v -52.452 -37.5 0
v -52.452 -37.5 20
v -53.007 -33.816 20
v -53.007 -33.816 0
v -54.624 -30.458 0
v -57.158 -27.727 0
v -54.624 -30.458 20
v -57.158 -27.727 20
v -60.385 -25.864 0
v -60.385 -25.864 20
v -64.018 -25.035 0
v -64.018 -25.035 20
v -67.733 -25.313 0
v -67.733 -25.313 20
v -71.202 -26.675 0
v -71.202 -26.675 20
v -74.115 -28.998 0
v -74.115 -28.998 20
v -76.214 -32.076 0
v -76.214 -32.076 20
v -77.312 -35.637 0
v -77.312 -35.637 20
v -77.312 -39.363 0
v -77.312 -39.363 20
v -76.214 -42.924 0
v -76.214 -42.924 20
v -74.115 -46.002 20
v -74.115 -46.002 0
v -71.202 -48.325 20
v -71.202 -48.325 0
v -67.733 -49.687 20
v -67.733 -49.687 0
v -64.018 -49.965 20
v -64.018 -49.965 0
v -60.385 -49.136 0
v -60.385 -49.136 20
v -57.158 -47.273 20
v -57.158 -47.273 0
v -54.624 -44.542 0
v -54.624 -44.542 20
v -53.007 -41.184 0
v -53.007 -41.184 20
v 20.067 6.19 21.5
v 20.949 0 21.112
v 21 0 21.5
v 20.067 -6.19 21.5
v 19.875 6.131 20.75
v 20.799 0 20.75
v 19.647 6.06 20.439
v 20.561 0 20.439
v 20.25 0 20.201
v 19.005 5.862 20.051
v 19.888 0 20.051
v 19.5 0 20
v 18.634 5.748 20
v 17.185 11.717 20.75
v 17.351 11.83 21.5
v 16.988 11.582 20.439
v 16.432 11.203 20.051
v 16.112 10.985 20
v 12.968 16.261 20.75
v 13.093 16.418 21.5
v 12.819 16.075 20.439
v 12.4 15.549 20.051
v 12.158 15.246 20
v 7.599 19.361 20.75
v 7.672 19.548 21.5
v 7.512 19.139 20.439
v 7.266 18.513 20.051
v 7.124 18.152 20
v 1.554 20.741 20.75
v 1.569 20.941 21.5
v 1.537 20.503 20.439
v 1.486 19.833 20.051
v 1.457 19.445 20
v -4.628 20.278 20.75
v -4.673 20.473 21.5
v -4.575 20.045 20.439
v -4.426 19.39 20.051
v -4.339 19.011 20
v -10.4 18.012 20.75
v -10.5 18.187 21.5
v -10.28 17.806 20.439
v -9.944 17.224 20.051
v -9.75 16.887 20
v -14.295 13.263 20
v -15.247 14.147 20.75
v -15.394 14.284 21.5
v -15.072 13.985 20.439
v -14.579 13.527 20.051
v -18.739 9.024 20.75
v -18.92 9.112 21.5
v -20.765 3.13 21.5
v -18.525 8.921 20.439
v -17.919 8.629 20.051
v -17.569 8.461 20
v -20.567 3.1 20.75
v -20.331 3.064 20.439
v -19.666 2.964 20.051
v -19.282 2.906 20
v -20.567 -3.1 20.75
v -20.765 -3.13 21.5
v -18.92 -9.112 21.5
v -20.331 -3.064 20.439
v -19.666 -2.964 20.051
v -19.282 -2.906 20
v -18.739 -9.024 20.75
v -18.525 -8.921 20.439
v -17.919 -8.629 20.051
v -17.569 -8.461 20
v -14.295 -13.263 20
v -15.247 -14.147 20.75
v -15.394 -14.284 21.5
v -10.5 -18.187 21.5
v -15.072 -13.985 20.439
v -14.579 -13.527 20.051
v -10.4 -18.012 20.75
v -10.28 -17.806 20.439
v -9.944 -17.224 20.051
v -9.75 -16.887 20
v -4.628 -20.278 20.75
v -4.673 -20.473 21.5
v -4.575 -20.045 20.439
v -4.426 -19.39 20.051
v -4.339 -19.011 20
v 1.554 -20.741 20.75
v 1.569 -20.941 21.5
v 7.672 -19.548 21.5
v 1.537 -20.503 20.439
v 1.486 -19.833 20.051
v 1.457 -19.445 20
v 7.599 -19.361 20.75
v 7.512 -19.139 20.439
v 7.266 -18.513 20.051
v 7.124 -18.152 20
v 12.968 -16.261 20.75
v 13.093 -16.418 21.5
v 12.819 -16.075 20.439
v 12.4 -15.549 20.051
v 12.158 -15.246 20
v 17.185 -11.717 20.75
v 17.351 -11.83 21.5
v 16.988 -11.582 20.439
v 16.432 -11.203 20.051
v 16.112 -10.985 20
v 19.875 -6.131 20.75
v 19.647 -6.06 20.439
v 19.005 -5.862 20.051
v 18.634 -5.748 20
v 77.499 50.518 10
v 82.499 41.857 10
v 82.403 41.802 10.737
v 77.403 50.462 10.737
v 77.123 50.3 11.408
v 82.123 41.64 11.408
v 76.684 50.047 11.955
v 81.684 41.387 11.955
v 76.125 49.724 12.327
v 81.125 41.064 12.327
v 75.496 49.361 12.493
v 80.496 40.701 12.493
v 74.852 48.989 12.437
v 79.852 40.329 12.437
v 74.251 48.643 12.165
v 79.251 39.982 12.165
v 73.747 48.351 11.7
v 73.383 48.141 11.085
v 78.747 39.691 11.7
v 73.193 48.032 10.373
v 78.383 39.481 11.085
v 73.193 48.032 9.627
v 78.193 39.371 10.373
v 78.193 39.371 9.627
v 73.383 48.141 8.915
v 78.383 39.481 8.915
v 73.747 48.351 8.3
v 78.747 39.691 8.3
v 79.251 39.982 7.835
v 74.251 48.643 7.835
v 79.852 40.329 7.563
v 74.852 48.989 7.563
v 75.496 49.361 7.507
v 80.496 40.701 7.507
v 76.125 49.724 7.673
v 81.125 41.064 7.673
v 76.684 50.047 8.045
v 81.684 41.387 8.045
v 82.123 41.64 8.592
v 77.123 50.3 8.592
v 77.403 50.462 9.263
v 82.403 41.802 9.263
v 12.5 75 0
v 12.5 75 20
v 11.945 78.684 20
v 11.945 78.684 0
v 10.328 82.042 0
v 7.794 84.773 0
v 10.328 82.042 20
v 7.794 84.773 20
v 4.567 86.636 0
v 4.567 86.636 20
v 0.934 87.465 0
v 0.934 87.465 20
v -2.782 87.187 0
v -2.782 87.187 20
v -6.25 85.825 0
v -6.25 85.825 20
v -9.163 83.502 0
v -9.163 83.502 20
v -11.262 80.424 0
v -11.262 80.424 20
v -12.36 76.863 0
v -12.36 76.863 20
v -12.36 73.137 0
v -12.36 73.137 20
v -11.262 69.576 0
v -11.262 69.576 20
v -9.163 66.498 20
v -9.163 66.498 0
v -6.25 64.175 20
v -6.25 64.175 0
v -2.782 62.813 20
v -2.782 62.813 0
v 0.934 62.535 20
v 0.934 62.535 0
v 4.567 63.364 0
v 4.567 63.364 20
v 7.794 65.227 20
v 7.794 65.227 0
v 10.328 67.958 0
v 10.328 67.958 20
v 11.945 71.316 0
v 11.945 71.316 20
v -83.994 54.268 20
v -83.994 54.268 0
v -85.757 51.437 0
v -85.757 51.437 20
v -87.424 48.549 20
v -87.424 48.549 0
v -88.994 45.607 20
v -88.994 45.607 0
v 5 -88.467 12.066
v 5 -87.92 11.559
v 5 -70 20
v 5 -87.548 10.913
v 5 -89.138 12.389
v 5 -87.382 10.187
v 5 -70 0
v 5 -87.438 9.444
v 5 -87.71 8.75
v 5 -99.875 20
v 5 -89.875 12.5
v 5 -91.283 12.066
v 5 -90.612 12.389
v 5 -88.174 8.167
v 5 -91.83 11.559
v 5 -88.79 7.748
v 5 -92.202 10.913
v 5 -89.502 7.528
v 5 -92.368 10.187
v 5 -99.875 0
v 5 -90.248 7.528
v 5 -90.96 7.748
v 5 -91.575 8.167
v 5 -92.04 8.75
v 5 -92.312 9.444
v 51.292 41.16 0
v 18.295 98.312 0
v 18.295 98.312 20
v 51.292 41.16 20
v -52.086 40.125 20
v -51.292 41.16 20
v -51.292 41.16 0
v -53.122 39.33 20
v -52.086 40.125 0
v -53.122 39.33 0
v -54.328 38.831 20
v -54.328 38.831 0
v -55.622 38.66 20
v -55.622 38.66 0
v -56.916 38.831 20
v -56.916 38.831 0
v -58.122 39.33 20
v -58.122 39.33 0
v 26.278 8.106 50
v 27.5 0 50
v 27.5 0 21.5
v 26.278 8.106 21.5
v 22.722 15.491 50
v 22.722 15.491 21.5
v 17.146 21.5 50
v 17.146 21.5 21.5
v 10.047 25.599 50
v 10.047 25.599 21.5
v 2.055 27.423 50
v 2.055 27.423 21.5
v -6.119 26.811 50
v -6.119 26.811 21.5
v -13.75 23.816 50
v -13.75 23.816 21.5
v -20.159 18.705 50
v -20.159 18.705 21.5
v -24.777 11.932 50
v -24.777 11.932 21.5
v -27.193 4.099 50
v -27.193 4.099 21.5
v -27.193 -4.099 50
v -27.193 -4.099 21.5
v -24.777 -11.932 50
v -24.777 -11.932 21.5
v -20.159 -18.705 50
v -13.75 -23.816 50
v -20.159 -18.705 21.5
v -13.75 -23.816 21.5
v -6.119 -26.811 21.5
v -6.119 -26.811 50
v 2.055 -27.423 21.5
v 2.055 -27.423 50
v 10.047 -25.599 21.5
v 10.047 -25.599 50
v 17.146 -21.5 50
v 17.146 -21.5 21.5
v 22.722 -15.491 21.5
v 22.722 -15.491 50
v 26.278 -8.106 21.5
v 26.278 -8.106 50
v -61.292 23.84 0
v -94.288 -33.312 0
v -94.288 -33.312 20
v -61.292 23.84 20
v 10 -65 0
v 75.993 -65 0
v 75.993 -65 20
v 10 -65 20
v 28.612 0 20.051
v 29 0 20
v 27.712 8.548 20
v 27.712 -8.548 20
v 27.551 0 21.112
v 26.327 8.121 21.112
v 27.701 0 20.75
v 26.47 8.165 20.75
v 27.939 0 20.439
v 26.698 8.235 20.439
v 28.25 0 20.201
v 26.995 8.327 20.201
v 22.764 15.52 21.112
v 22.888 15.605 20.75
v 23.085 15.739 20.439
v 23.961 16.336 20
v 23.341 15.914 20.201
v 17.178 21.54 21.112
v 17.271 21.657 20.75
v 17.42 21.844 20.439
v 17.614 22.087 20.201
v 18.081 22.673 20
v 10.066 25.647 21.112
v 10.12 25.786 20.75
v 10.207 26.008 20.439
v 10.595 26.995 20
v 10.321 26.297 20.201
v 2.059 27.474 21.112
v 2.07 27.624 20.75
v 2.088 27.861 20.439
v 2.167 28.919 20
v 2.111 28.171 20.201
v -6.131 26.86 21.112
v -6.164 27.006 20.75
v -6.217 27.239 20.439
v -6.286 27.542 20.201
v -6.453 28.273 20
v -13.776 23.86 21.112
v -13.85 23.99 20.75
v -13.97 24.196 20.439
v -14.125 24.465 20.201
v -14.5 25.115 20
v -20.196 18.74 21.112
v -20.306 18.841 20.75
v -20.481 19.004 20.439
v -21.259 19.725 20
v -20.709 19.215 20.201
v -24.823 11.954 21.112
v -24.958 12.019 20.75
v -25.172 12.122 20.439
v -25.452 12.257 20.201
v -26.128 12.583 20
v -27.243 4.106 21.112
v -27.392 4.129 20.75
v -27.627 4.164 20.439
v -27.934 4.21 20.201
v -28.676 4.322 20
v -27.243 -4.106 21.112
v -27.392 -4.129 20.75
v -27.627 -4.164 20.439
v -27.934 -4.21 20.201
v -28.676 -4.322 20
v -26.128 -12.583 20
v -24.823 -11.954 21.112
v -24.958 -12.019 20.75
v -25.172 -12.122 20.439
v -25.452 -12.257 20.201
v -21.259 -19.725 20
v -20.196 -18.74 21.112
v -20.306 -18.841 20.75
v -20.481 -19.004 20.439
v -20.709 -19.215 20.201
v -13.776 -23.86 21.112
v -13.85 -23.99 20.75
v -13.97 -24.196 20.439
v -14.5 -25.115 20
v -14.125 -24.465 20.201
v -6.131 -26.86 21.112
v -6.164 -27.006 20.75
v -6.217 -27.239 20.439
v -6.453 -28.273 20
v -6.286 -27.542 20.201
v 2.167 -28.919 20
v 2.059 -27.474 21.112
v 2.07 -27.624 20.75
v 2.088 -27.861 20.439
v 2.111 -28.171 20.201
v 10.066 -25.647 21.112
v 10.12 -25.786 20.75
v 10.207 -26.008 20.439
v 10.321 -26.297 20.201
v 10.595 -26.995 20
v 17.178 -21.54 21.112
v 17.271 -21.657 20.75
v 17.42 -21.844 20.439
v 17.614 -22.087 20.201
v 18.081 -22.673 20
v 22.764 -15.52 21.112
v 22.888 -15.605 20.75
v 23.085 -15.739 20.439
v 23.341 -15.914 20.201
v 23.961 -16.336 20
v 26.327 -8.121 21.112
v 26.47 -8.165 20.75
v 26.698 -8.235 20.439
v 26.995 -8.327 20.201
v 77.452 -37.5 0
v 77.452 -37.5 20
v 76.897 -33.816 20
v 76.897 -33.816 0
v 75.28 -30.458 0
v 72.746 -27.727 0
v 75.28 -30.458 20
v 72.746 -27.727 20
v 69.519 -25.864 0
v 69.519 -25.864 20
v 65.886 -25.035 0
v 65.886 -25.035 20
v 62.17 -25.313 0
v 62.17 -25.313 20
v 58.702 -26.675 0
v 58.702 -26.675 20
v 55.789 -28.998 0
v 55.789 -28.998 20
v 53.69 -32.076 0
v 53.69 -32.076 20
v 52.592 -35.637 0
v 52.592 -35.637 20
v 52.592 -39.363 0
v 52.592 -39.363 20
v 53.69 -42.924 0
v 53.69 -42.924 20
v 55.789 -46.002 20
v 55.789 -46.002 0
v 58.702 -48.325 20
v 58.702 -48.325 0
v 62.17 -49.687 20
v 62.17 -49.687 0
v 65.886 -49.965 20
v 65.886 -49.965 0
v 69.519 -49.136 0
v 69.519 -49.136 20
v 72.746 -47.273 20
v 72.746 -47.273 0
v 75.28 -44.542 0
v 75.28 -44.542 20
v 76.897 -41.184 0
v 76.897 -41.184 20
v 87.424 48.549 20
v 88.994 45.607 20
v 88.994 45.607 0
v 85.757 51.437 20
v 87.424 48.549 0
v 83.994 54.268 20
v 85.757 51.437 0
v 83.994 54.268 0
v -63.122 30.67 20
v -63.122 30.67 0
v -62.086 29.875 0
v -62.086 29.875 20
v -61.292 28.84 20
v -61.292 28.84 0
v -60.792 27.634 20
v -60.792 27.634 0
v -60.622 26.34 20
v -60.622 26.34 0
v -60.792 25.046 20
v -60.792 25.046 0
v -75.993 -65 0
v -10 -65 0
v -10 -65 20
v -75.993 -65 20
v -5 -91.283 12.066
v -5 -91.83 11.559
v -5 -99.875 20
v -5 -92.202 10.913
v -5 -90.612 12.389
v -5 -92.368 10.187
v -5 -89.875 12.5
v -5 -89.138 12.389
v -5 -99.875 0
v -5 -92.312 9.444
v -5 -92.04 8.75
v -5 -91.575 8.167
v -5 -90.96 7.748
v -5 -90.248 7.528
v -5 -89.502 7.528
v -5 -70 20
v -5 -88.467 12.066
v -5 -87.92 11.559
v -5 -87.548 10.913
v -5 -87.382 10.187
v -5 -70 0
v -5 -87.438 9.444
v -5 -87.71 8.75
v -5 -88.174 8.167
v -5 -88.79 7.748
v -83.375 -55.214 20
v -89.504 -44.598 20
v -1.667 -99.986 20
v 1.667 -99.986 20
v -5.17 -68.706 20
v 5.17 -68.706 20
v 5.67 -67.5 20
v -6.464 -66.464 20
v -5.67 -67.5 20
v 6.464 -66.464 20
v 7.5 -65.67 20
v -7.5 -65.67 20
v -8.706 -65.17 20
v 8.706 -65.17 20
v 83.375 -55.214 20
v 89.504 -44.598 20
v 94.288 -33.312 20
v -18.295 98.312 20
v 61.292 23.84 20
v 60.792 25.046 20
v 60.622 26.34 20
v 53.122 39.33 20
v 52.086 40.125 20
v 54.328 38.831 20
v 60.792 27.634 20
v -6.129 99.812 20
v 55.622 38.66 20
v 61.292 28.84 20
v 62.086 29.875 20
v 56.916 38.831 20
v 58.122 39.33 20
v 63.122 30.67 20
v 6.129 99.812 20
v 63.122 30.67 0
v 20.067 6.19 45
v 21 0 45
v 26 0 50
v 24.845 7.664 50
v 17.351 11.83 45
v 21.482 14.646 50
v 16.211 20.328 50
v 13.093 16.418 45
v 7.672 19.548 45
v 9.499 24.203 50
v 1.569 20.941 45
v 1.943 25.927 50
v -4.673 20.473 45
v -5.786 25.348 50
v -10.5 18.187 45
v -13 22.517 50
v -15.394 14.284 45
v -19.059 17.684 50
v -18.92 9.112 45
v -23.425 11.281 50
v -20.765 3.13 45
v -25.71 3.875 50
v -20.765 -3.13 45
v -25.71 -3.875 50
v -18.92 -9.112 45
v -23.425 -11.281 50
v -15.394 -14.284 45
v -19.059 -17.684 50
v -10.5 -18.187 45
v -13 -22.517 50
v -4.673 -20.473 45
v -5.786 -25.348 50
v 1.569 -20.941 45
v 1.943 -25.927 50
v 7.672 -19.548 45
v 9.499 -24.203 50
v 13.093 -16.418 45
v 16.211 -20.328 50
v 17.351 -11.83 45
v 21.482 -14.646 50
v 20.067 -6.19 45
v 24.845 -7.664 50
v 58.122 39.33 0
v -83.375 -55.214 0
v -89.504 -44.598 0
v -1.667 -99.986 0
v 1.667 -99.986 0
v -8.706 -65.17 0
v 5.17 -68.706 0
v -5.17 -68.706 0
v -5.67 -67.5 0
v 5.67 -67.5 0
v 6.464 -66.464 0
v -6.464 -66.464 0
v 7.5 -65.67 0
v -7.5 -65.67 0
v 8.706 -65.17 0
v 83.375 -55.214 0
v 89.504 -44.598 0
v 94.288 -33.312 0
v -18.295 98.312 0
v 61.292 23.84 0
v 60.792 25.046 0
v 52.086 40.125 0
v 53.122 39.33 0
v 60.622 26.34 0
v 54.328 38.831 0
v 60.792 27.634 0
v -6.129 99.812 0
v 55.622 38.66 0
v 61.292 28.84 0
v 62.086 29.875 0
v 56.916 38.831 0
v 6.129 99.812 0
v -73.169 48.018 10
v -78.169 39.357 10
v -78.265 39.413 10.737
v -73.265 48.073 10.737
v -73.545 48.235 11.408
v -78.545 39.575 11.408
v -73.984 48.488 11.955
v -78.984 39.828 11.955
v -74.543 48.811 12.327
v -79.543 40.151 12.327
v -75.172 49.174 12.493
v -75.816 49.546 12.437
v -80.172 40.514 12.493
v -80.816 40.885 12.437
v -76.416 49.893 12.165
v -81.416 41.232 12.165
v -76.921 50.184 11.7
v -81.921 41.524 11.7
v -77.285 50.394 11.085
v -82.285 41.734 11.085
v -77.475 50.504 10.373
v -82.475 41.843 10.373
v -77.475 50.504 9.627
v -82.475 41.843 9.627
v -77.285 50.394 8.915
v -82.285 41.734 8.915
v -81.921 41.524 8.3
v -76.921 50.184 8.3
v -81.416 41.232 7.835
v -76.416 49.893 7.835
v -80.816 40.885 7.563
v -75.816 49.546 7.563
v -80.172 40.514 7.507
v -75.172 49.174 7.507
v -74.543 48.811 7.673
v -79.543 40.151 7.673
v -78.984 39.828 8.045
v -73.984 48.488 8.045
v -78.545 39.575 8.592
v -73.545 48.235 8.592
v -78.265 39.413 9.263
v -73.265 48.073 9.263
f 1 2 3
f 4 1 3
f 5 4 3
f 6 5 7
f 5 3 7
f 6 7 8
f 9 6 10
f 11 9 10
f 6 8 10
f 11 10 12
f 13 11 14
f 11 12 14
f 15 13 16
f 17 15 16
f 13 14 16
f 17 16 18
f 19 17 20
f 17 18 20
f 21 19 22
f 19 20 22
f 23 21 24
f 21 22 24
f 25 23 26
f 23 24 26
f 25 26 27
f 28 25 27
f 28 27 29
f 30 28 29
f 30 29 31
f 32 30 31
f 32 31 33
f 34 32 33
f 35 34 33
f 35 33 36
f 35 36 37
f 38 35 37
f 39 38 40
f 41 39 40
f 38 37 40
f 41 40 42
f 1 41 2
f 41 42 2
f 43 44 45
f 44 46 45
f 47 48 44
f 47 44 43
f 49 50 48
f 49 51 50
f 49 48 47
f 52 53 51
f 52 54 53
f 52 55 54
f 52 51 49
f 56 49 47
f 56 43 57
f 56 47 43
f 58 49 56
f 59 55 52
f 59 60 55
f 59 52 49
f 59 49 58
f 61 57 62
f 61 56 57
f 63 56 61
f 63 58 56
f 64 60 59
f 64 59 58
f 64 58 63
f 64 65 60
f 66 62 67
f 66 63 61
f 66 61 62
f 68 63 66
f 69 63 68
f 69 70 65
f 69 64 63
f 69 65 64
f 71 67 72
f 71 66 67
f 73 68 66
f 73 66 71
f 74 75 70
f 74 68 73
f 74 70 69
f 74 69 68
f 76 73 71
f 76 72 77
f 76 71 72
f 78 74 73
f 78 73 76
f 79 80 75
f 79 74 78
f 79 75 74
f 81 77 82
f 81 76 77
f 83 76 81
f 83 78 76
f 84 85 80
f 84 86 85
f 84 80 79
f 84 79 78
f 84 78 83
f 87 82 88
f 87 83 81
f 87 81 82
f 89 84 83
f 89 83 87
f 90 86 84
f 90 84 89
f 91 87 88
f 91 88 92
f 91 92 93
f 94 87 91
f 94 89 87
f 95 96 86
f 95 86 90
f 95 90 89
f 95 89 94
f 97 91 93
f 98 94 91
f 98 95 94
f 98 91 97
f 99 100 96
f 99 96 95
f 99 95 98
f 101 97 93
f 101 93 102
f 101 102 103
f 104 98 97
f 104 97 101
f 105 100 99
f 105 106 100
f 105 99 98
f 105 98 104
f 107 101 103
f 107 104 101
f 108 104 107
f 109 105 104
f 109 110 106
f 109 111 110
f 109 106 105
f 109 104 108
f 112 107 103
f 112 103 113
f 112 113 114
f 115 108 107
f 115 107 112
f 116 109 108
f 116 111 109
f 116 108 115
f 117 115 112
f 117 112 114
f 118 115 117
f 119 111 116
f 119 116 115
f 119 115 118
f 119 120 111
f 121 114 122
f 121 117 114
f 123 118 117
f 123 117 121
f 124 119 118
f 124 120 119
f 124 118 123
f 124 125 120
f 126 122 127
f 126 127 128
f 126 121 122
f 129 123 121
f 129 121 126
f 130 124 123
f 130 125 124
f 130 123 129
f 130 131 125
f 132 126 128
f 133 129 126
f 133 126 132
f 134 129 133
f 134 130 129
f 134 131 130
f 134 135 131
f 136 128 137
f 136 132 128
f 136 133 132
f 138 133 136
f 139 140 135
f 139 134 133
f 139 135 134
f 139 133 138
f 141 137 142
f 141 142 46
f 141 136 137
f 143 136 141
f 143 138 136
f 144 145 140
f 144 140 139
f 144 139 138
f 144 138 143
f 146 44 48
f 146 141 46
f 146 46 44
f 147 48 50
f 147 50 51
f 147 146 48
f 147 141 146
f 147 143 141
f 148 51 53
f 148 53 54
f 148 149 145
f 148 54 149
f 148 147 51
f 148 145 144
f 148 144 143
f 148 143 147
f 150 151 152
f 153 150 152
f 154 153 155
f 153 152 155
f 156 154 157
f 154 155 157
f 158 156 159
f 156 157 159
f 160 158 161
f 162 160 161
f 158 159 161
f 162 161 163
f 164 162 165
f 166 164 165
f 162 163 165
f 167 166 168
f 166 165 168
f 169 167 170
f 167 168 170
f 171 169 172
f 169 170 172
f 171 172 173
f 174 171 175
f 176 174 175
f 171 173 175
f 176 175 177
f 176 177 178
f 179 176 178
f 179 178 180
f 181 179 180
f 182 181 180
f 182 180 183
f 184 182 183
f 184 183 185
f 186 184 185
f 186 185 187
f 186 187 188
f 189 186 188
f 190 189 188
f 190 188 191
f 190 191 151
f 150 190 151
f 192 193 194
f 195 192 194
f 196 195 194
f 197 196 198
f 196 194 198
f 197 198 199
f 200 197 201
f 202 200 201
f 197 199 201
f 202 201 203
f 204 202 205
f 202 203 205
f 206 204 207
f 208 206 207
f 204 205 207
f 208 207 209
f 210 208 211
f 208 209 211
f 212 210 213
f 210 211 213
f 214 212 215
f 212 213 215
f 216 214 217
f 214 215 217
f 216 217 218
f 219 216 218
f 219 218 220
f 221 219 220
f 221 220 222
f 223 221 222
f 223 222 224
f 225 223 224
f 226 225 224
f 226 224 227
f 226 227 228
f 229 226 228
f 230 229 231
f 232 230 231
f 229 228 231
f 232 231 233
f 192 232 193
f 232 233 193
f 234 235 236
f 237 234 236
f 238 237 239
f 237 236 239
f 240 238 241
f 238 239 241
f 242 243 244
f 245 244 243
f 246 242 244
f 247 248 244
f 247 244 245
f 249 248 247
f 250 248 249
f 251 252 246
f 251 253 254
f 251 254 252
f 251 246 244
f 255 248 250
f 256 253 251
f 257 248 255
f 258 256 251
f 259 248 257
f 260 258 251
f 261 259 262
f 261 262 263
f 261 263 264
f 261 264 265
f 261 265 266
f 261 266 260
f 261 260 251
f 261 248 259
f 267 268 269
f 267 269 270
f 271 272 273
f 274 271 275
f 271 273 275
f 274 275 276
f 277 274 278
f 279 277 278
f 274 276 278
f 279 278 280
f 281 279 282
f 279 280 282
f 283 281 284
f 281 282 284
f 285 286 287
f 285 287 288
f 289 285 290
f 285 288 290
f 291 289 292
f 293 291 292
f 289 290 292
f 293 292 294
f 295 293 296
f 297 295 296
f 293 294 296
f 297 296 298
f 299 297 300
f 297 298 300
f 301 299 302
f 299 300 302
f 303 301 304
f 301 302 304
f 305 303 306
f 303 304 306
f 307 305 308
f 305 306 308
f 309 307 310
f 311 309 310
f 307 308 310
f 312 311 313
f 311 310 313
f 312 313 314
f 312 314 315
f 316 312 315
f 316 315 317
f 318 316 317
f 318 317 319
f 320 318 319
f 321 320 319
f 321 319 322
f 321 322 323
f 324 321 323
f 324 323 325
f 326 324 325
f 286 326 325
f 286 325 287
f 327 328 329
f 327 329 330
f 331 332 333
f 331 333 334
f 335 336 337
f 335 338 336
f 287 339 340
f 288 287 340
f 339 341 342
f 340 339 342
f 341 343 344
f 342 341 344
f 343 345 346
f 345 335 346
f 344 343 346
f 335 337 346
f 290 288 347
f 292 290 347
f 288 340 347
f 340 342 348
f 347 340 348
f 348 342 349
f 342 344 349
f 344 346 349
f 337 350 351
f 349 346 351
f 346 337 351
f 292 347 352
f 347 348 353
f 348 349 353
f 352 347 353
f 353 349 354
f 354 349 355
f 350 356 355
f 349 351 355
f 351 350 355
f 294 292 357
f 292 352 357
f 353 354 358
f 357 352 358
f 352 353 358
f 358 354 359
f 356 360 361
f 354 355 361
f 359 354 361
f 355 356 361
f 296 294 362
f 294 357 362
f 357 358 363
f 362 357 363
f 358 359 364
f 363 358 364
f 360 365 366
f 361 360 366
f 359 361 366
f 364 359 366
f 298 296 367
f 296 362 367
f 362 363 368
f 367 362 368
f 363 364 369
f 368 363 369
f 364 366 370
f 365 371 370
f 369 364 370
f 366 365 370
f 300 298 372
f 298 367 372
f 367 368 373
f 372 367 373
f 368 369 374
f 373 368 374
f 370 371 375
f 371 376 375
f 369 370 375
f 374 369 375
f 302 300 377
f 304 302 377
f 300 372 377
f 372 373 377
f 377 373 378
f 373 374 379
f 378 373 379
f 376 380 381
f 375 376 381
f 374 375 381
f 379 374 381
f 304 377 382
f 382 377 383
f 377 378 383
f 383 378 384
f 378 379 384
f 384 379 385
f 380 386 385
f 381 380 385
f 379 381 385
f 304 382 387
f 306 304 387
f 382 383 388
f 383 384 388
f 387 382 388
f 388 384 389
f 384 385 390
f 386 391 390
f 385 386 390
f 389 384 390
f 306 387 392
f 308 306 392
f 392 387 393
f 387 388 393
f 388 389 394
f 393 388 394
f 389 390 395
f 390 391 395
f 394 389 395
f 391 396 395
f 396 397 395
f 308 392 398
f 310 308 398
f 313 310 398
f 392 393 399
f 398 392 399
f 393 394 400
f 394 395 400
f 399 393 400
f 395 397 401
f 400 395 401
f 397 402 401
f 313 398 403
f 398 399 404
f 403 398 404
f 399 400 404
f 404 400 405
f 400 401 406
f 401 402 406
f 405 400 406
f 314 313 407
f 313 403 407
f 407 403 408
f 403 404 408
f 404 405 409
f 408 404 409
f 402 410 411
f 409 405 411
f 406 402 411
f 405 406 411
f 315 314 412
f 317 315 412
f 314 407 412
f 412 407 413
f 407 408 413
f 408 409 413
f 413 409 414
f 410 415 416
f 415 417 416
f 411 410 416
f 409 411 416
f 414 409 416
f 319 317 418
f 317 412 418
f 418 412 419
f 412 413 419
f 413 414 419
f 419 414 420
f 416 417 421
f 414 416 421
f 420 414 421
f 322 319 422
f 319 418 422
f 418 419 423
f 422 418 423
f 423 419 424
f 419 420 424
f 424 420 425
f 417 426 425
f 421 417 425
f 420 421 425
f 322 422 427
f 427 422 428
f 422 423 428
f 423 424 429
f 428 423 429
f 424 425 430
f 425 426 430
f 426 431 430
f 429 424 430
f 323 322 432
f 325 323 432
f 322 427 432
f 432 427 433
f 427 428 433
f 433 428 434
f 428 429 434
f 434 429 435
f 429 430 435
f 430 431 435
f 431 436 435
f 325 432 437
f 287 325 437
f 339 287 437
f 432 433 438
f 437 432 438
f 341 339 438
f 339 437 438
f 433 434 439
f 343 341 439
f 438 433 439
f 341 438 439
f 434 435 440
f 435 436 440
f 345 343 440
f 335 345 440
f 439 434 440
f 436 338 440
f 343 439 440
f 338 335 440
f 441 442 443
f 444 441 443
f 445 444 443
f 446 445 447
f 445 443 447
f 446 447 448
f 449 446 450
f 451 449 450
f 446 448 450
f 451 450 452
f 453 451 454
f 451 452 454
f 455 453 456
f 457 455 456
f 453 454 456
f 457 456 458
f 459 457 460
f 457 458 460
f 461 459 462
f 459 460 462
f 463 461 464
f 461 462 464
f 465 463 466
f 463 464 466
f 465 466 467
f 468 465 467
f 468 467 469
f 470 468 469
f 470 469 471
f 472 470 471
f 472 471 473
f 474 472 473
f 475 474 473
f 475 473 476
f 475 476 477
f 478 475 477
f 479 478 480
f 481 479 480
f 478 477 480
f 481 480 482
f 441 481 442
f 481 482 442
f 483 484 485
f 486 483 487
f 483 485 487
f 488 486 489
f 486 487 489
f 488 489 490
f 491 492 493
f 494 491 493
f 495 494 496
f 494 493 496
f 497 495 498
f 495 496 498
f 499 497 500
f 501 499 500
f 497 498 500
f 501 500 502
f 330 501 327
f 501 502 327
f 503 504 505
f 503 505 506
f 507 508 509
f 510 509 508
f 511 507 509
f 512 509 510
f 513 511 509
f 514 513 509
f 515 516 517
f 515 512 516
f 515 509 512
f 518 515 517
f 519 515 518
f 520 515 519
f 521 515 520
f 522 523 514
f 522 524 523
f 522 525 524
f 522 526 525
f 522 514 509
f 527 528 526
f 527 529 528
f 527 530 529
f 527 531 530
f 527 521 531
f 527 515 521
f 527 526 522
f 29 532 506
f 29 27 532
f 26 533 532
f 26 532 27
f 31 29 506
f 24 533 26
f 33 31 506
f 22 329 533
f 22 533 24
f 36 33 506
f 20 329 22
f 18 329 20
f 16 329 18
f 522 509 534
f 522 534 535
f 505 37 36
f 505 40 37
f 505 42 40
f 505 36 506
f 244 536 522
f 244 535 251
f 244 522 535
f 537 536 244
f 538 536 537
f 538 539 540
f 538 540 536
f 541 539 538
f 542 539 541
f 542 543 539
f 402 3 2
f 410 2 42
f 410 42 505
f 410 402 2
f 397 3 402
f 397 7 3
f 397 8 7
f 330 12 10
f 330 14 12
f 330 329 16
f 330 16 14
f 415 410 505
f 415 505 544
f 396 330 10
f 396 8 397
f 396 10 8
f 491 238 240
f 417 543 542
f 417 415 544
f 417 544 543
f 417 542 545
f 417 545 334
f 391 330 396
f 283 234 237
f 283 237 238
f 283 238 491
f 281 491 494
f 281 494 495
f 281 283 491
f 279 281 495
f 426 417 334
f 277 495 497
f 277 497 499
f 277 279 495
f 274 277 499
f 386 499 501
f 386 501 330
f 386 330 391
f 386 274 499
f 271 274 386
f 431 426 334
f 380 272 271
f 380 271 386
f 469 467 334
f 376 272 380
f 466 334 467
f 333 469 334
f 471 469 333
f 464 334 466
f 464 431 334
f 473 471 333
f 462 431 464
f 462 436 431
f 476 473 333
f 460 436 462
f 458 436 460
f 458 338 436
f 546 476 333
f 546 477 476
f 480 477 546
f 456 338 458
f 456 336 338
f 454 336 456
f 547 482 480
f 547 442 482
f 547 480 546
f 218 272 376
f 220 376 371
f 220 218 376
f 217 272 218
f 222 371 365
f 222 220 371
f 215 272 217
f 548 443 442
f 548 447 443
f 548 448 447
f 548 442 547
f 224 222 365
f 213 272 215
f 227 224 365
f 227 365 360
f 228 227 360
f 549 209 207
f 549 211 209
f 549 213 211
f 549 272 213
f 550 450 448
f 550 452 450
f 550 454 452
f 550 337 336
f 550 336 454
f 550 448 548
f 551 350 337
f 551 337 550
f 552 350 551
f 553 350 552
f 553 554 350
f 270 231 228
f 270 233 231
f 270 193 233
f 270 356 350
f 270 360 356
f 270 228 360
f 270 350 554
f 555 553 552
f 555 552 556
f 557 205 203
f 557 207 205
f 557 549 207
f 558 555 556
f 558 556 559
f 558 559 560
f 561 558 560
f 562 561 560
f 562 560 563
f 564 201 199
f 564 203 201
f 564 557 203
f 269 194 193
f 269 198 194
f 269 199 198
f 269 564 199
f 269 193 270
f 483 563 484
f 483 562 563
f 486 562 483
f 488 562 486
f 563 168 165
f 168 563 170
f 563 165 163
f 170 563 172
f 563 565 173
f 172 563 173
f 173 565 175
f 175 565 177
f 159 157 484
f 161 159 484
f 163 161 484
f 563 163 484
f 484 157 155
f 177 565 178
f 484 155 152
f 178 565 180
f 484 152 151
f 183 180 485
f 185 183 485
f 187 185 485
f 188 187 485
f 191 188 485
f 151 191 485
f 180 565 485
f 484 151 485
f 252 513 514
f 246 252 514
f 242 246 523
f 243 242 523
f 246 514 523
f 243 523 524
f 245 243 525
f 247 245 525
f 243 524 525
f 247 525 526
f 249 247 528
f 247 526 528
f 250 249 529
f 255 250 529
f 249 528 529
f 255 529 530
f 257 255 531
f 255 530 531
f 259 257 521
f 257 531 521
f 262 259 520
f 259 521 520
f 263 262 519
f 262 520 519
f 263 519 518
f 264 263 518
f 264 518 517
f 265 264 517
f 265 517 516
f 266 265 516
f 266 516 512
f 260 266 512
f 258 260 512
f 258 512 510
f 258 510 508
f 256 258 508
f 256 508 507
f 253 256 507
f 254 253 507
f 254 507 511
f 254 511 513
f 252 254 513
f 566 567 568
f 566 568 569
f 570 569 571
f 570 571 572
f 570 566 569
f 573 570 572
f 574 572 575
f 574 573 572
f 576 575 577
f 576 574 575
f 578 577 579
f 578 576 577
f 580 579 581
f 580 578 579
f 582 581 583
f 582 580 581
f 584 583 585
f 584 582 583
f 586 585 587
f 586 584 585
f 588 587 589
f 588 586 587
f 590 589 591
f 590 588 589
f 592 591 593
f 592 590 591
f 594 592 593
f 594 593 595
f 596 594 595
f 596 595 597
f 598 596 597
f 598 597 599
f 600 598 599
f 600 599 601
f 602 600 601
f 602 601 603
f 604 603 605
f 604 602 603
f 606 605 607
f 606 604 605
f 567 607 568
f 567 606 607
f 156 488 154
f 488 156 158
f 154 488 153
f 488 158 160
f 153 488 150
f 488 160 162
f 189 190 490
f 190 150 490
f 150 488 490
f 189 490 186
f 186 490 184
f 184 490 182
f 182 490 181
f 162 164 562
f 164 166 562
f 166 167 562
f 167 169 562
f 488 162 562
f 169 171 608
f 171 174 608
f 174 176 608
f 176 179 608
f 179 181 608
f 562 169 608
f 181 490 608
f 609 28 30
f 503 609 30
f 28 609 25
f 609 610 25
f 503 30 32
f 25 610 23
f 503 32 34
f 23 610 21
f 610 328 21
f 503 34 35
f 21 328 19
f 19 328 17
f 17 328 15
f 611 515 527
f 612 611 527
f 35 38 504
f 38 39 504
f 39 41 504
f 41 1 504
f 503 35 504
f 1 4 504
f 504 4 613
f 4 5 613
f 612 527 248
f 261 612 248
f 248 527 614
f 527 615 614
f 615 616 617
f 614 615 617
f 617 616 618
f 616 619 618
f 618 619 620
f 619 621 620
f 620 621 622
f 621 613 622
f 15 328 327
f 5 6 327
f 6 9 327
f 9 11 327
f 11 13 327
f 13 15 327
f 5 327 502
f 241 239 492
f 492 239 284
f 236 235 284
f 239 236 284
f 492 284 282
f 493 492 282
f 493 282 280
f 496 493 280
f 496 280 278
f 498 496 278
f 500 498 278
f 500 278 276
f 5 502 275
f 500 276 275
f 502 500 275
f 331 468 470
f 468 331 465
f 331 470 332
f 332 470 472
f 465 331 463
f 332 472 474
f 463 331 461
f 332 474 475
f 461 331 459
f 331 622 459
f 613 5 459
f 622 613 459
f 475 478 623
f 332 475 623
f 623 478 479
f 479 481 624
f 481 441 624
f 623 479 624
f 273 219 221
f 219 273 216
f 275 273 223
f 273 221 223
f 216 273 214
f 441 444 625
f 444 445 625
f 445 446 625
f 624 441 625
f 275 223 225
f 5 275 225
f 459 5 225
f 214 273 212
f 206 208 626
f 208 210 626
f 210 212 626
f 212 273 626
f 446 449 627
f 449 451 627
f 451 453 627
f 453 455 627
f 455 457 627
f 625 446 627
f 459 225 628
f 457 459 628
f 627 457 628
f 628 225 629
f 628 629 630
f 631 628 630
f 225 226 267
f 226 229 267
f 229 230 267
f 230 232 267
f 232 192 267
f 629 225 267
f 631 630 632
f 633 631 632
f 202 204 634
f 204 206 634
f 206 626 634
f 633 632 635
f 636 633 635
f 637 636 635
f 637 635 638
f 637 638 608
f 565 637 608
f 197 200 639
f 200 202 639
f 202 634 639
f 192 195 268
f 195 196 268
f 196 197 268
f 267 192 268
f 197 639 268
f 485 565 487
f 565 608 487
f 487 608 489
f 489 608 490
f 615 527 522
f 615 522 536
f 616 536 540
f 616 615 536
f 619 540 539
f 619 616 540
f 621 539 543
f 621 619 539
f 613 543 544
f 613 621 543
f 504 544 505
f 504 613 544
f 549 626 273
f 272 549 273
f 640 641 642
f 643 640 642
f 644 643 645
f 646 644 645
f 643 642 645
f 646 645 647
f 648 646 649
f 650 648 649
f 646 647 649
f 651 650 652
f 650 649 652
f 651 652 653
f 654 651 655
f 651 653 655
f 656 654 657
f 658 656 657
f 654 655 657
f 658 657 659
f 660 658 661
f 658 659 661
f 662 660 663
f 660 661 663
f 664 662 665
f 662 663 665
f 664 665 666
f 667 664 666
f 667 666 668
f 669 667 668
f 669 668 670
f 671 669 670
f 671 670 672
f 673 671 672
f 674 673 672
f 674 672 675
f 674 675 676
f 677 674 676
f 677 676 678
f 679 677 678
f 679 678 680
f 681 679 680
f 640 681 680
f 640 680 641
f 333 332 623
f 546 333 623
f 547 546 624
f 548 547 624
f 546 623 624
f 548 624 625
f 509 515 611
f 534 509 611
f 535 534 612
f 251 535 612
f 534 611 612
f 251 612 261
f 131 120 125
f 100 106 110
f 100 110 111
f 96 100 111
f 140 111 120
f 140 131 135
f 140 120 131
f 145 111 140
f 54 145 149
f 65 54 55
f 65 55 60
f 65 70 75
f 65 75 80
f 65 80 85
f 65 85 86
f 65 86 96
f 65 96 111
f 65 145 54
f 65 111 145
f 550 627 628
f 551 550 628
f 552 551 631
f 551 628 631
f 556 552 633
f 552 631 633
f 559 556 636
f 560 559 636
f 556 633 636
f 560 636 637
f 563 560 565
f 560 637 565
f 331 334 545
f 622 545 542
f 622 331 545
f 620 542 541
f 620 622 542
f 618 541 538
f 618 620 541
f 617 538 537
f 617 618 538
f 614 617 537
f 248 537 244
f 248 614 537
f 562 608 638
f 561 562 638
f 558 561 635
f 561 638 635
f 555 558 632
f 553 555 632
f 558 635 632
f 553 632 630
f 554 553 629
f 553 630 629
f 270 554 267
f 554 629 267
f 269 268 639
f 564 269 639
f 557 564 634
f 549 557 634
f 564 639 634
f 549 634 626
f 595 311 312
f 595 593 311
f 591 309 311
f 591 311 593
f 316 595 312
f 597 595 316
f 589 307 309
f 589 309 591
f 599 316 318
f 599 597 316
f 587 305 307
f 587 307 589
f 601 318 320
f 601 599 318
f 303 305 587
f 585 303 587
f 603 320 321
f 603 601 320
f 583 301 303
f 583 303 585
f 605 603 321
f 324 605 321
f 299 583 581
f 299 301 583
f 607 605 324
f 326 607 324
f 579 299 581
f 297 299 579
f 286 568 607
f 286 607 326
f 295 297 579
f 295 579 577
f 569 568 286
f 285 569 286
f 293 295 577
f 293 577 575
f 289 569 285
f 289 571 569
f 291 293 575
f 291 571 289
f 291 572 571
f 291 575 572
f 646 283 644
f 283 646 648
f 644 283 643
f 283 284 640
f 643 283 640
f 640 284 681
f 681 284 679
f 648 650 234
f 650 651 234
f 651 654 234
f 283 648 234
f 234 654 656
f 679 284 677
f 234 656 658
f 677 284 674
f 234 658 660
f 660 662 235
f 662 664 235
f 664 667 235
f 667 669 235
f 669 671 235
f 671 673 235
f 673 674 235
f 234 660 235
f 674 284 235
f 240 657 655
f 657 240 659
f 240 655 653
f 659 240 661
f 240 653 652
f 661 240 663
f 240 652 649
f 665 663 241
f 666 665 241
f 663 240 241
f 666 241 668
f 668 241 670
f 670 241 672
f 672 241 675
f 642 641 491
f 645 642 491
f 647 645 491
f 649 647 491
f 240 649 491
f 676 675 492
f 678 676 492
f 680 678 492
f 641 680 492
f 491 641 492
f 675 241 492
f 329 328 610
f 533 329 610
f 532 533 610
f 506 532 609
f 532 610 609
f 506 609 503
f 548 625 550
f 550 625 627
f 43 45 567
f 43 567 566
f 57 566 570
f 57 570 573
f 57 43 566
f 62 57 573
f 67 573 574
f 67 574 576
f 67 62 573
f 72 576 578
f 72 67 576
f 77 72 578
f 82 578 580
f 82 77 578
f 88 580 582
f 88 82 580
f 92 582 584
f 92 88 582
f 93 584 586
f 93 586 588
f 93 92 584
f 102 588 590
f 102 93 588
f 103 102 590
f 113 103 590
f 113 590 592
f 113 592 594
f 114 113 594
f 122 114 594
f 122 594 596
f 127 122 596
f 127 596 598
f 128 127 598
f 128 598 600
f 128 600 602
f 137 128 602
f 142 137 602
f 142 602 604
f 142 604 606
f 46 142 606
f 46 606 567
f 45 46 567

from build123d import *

# Parameters (mm, degrees)
SKETCH1_R           = 27.5
SKETCH1_R_2         = 21
BOSS_EXTRUDE1_DEPTH = 50
SKETCH1_3_R         = 100
SKETCH1_3_R_2       = 27.5
SKETCH1_3_R_3       = 21
BOSS_EXTRUDE2_DEPTH = 20
CHAMFER1_SIZE       = 5
FILLET1_R           = 1.5
SKETCH10_R          = 12.5
CUT_EXTRUDE1_DEPTH  = 20
SKETCH12_W          = 90
SKETCH12_H          = 35
CUT_EXTRUDE3_DEPTH  = 151
SKETCH13_R          = 2.5
CUT_EXTRUDE4_DEPTH  = 151.840188116
SKETCH14_R          = 2.5
CUT_EXTRUDE5_DEPTH  = 150.526515224
SKETCH15_R          = 2.5
CUT_EXTRUDE6_DEPTH  = 151.840188116


with BuildPart() as part:
    # Sketch1 → Boss-Extrude1 (new body)
    with BuildSketch(Plane.XY):
        Circle(SKETCH1_R)
        Circle(SKETCH1_R_2, mode=Mode.SUBTRACT)
    extrude(amount=BOSS_EXTRUDE1_DEPTH)

    # Sketch1<3> → Boss-Extrude2 (add)
    # profile 1 of 2: a face of its own
    with BuildSketch(Plane.XY):
        Circle(SKETCH1_3_R)
        Circle(SKETCH1_3_R_2, mode=Mode.SUBTRACT)
    # profile 2 of 2: a face of its own
    with BuildSketch(Plane.XY):
        Circle(SKETCH1_3_R_3)
    extrude(amount=BOSS_EXTRUDE2_DEPTH)

    # Chamfer1
    chamfer1_edges = [part.edges().sort_by_distance(p)[0] for p in [
        (-21, 0, 50),
    ]]
    chamfer(chamfer1_edges, length=CHAMFER1_SIZE)

    # Fillet1
    fillet1_edges = [part.edges().sort_by_distance(p)[0] for p in [
        (-21, 0, 20),
        (-27.5, 0, 20),
    ]]
    fillet(fillet1_edges, radius=FILLET1_R)

    # Sketch10 → Cut-Extrude1 (cut)
    with BuildSketch(Plane.XY.offset(20)):
        with Locations((0, 75)):
            Circle(SKETCH10_R)
        with Locations((64.951905284, -37.5)):
            Circle(SKETCH10_R)
        with Locations((-64.951905284, -37.5)):
            Circle(SKETCH10_R)
    extrude(amount=-CUT_EXTRUDE1_DEPTH, mode=Mode.SUBTRACT)

    # Sketch12 → Cut-Extrude3 (cut, through all)
    with BuildSketch(Plane(origin=(0, 0, 0), x_dir=(-1, 0, 0), z_dir=(0, 0, -1))):
        with BuildLine():
            Line((-15, -130), (-15, -70))
            ThreePointArc((-15, -70), (-10, -65), (-5, -70))
            Line((-5, -70), (-5, -130))
            ThreePointArc((-5, -130), (-10, -135), (-15, -130))
        make_face()
        Polygon((-61.291651246, 23.839745962), (-91.602540378, 41.339745962), (-136.602540378, -36.602540378), (-106.291651246, -54.102540378), align=None)
        with BuildLine():
            Line((5, -130), (5, -70))
            ThreePointArc((5, -70), (10, -65), (15, -70))
            Line((15, -70), (15, -130))
            ThreePointArc((15, -130), (10, -135), (5, -130))
        make_face()
        with Locations((-55, -82.5)):
            Rectangle(SKETCH12_W, SKETCH12_H)
        with Locations((55, -82.5)):
            Rectangle(SKETCH12_W, SKETCH12_H)
        Polygon((-51.291651246, 41.160254038), (-81.602540378, 58.660254038), (-36.602540378, 136.602540378), (-6.291651246, 119.102540378), align=None)
        with BuildLine():
            Line((-110.083302492, 69.330127019), (-58.121778265, 39.330127019))
            ThreePointArc((-58.121778265, 39.330127019), (-51.291651246, 41.160254038), (-53.121778265, 47.990381057))
            Line((-53.121778265, 47.990381057), (-105.083302492, 77.990381057))
            ThreePointArc((-105.083302492, 77.990381057), (-111.913429511, 76.160254038), (-110.083302492, 69.330127019))
        make_face()
        with BuildLine():
            Line((-120.083302492, 52.009618943), (-68.121778265, 22.009618943))
            ThreePointArc((-68.121778265, 22.009618943), (-61.291651246, 23.839745962), (-63.121778265, 30.669872981))
            Line((-63.121778265, 30.669872981), (-115.083302492, 60.669872981))
            ThreePointArc((-115.083302492, 60.669872981), (-121.913429511, 58.839745962), (-120.083302492, 52.009618943))
        make_face()
        Polygon((51.291651246, 41.160254038), (81.602540378, 58.660254038), (36.602540378, 136.602540378), (6.291651246, 119.102540378), align=None)
        Polygon((61.291651246, 23.839745962), (91.602540378, 41.339745962), (136.602540378, -36.602540378), (106.291651246, -54.102540378), align=None)
        with BuildLine():
            Line((115.083302492, 60.669872981), (63.121778265, 30.669872981))
            ThreePointArc((63.121778265, 30.669872981), (61.291651246, 23.839745962), (68.121778265, 22.009618943))
            Line((68.121778265, 22.009618943), (120.083302492, 52.009618943))
            ThreePointArc((120.083302492, 52.009618943), (121.913429511, 58.839745962), (115.083302492, 60.669872981))
        make_face()
        with BuildLine():
            Line((105.083302492, 77.990381057), (53.121778265, 47.990381057))
            ThreePointArc((53.121778265, 47.990381057), (51.291651246, 41.160254038), (58.121778265, 39.330127019))
            Line((58.121778265, 39.330127019), (110.083302492, 69.330127019))
            ThreePointArc((110.083302492, 69.330127019), (111.913429511, 76.160254038), (105.083302492, 77.990381057))
        make_face()
    extrude(amount=-CUT_EXTRUDE3_DEPTH, mode=Mode.SUBTRACT)

    # Sketch13 → Cut-Extrude4 (cut, through all)
    with BuildSketch(Plane(origin=(2.5, -4.330127019, 0), x_dir=(0.8660254037844378, 0.5000000000000017, 0), z_dir=(0.5000000000000016, -0.8660254037844377, 0))):
        with Locations((89.874921777, 10)):
            Circle(SKETCH13_R)
    extrude(amount=-CUT_EXTRUDE4_DEPTH, mode=Mode.SUBTRACT)

    # Sketch14 → Cut-Extrude5 (cut, through all)
    with BuildSketch(Plane.ZY.offset(5)):
        with Locations((10, -89.874921777)):
            Circle(SKETCH14_R)
    extrude(amount=-CUT_EXTRUDE5_DEPTH, mode=Mode.SUBTRACT)

    # Sketch15 → Cut-Extrude6 (cut, through all)
    with BuildSketch(Plane(origin=(-2.5, -4.330127019, 0), x_dir=(0.8660254037844392, -0.49999999999999906, 0), z_dir=(-0.49999999999999906, -0.8660254037844392, 0))):
        with Locations((-89.874921777, 10)):
            Circle(SKETCH15_R)
    extrude(amount=-CUT_EXTRUDE6_DEPTH, mode=Mode.SUBTRACT)


solid = part.part
